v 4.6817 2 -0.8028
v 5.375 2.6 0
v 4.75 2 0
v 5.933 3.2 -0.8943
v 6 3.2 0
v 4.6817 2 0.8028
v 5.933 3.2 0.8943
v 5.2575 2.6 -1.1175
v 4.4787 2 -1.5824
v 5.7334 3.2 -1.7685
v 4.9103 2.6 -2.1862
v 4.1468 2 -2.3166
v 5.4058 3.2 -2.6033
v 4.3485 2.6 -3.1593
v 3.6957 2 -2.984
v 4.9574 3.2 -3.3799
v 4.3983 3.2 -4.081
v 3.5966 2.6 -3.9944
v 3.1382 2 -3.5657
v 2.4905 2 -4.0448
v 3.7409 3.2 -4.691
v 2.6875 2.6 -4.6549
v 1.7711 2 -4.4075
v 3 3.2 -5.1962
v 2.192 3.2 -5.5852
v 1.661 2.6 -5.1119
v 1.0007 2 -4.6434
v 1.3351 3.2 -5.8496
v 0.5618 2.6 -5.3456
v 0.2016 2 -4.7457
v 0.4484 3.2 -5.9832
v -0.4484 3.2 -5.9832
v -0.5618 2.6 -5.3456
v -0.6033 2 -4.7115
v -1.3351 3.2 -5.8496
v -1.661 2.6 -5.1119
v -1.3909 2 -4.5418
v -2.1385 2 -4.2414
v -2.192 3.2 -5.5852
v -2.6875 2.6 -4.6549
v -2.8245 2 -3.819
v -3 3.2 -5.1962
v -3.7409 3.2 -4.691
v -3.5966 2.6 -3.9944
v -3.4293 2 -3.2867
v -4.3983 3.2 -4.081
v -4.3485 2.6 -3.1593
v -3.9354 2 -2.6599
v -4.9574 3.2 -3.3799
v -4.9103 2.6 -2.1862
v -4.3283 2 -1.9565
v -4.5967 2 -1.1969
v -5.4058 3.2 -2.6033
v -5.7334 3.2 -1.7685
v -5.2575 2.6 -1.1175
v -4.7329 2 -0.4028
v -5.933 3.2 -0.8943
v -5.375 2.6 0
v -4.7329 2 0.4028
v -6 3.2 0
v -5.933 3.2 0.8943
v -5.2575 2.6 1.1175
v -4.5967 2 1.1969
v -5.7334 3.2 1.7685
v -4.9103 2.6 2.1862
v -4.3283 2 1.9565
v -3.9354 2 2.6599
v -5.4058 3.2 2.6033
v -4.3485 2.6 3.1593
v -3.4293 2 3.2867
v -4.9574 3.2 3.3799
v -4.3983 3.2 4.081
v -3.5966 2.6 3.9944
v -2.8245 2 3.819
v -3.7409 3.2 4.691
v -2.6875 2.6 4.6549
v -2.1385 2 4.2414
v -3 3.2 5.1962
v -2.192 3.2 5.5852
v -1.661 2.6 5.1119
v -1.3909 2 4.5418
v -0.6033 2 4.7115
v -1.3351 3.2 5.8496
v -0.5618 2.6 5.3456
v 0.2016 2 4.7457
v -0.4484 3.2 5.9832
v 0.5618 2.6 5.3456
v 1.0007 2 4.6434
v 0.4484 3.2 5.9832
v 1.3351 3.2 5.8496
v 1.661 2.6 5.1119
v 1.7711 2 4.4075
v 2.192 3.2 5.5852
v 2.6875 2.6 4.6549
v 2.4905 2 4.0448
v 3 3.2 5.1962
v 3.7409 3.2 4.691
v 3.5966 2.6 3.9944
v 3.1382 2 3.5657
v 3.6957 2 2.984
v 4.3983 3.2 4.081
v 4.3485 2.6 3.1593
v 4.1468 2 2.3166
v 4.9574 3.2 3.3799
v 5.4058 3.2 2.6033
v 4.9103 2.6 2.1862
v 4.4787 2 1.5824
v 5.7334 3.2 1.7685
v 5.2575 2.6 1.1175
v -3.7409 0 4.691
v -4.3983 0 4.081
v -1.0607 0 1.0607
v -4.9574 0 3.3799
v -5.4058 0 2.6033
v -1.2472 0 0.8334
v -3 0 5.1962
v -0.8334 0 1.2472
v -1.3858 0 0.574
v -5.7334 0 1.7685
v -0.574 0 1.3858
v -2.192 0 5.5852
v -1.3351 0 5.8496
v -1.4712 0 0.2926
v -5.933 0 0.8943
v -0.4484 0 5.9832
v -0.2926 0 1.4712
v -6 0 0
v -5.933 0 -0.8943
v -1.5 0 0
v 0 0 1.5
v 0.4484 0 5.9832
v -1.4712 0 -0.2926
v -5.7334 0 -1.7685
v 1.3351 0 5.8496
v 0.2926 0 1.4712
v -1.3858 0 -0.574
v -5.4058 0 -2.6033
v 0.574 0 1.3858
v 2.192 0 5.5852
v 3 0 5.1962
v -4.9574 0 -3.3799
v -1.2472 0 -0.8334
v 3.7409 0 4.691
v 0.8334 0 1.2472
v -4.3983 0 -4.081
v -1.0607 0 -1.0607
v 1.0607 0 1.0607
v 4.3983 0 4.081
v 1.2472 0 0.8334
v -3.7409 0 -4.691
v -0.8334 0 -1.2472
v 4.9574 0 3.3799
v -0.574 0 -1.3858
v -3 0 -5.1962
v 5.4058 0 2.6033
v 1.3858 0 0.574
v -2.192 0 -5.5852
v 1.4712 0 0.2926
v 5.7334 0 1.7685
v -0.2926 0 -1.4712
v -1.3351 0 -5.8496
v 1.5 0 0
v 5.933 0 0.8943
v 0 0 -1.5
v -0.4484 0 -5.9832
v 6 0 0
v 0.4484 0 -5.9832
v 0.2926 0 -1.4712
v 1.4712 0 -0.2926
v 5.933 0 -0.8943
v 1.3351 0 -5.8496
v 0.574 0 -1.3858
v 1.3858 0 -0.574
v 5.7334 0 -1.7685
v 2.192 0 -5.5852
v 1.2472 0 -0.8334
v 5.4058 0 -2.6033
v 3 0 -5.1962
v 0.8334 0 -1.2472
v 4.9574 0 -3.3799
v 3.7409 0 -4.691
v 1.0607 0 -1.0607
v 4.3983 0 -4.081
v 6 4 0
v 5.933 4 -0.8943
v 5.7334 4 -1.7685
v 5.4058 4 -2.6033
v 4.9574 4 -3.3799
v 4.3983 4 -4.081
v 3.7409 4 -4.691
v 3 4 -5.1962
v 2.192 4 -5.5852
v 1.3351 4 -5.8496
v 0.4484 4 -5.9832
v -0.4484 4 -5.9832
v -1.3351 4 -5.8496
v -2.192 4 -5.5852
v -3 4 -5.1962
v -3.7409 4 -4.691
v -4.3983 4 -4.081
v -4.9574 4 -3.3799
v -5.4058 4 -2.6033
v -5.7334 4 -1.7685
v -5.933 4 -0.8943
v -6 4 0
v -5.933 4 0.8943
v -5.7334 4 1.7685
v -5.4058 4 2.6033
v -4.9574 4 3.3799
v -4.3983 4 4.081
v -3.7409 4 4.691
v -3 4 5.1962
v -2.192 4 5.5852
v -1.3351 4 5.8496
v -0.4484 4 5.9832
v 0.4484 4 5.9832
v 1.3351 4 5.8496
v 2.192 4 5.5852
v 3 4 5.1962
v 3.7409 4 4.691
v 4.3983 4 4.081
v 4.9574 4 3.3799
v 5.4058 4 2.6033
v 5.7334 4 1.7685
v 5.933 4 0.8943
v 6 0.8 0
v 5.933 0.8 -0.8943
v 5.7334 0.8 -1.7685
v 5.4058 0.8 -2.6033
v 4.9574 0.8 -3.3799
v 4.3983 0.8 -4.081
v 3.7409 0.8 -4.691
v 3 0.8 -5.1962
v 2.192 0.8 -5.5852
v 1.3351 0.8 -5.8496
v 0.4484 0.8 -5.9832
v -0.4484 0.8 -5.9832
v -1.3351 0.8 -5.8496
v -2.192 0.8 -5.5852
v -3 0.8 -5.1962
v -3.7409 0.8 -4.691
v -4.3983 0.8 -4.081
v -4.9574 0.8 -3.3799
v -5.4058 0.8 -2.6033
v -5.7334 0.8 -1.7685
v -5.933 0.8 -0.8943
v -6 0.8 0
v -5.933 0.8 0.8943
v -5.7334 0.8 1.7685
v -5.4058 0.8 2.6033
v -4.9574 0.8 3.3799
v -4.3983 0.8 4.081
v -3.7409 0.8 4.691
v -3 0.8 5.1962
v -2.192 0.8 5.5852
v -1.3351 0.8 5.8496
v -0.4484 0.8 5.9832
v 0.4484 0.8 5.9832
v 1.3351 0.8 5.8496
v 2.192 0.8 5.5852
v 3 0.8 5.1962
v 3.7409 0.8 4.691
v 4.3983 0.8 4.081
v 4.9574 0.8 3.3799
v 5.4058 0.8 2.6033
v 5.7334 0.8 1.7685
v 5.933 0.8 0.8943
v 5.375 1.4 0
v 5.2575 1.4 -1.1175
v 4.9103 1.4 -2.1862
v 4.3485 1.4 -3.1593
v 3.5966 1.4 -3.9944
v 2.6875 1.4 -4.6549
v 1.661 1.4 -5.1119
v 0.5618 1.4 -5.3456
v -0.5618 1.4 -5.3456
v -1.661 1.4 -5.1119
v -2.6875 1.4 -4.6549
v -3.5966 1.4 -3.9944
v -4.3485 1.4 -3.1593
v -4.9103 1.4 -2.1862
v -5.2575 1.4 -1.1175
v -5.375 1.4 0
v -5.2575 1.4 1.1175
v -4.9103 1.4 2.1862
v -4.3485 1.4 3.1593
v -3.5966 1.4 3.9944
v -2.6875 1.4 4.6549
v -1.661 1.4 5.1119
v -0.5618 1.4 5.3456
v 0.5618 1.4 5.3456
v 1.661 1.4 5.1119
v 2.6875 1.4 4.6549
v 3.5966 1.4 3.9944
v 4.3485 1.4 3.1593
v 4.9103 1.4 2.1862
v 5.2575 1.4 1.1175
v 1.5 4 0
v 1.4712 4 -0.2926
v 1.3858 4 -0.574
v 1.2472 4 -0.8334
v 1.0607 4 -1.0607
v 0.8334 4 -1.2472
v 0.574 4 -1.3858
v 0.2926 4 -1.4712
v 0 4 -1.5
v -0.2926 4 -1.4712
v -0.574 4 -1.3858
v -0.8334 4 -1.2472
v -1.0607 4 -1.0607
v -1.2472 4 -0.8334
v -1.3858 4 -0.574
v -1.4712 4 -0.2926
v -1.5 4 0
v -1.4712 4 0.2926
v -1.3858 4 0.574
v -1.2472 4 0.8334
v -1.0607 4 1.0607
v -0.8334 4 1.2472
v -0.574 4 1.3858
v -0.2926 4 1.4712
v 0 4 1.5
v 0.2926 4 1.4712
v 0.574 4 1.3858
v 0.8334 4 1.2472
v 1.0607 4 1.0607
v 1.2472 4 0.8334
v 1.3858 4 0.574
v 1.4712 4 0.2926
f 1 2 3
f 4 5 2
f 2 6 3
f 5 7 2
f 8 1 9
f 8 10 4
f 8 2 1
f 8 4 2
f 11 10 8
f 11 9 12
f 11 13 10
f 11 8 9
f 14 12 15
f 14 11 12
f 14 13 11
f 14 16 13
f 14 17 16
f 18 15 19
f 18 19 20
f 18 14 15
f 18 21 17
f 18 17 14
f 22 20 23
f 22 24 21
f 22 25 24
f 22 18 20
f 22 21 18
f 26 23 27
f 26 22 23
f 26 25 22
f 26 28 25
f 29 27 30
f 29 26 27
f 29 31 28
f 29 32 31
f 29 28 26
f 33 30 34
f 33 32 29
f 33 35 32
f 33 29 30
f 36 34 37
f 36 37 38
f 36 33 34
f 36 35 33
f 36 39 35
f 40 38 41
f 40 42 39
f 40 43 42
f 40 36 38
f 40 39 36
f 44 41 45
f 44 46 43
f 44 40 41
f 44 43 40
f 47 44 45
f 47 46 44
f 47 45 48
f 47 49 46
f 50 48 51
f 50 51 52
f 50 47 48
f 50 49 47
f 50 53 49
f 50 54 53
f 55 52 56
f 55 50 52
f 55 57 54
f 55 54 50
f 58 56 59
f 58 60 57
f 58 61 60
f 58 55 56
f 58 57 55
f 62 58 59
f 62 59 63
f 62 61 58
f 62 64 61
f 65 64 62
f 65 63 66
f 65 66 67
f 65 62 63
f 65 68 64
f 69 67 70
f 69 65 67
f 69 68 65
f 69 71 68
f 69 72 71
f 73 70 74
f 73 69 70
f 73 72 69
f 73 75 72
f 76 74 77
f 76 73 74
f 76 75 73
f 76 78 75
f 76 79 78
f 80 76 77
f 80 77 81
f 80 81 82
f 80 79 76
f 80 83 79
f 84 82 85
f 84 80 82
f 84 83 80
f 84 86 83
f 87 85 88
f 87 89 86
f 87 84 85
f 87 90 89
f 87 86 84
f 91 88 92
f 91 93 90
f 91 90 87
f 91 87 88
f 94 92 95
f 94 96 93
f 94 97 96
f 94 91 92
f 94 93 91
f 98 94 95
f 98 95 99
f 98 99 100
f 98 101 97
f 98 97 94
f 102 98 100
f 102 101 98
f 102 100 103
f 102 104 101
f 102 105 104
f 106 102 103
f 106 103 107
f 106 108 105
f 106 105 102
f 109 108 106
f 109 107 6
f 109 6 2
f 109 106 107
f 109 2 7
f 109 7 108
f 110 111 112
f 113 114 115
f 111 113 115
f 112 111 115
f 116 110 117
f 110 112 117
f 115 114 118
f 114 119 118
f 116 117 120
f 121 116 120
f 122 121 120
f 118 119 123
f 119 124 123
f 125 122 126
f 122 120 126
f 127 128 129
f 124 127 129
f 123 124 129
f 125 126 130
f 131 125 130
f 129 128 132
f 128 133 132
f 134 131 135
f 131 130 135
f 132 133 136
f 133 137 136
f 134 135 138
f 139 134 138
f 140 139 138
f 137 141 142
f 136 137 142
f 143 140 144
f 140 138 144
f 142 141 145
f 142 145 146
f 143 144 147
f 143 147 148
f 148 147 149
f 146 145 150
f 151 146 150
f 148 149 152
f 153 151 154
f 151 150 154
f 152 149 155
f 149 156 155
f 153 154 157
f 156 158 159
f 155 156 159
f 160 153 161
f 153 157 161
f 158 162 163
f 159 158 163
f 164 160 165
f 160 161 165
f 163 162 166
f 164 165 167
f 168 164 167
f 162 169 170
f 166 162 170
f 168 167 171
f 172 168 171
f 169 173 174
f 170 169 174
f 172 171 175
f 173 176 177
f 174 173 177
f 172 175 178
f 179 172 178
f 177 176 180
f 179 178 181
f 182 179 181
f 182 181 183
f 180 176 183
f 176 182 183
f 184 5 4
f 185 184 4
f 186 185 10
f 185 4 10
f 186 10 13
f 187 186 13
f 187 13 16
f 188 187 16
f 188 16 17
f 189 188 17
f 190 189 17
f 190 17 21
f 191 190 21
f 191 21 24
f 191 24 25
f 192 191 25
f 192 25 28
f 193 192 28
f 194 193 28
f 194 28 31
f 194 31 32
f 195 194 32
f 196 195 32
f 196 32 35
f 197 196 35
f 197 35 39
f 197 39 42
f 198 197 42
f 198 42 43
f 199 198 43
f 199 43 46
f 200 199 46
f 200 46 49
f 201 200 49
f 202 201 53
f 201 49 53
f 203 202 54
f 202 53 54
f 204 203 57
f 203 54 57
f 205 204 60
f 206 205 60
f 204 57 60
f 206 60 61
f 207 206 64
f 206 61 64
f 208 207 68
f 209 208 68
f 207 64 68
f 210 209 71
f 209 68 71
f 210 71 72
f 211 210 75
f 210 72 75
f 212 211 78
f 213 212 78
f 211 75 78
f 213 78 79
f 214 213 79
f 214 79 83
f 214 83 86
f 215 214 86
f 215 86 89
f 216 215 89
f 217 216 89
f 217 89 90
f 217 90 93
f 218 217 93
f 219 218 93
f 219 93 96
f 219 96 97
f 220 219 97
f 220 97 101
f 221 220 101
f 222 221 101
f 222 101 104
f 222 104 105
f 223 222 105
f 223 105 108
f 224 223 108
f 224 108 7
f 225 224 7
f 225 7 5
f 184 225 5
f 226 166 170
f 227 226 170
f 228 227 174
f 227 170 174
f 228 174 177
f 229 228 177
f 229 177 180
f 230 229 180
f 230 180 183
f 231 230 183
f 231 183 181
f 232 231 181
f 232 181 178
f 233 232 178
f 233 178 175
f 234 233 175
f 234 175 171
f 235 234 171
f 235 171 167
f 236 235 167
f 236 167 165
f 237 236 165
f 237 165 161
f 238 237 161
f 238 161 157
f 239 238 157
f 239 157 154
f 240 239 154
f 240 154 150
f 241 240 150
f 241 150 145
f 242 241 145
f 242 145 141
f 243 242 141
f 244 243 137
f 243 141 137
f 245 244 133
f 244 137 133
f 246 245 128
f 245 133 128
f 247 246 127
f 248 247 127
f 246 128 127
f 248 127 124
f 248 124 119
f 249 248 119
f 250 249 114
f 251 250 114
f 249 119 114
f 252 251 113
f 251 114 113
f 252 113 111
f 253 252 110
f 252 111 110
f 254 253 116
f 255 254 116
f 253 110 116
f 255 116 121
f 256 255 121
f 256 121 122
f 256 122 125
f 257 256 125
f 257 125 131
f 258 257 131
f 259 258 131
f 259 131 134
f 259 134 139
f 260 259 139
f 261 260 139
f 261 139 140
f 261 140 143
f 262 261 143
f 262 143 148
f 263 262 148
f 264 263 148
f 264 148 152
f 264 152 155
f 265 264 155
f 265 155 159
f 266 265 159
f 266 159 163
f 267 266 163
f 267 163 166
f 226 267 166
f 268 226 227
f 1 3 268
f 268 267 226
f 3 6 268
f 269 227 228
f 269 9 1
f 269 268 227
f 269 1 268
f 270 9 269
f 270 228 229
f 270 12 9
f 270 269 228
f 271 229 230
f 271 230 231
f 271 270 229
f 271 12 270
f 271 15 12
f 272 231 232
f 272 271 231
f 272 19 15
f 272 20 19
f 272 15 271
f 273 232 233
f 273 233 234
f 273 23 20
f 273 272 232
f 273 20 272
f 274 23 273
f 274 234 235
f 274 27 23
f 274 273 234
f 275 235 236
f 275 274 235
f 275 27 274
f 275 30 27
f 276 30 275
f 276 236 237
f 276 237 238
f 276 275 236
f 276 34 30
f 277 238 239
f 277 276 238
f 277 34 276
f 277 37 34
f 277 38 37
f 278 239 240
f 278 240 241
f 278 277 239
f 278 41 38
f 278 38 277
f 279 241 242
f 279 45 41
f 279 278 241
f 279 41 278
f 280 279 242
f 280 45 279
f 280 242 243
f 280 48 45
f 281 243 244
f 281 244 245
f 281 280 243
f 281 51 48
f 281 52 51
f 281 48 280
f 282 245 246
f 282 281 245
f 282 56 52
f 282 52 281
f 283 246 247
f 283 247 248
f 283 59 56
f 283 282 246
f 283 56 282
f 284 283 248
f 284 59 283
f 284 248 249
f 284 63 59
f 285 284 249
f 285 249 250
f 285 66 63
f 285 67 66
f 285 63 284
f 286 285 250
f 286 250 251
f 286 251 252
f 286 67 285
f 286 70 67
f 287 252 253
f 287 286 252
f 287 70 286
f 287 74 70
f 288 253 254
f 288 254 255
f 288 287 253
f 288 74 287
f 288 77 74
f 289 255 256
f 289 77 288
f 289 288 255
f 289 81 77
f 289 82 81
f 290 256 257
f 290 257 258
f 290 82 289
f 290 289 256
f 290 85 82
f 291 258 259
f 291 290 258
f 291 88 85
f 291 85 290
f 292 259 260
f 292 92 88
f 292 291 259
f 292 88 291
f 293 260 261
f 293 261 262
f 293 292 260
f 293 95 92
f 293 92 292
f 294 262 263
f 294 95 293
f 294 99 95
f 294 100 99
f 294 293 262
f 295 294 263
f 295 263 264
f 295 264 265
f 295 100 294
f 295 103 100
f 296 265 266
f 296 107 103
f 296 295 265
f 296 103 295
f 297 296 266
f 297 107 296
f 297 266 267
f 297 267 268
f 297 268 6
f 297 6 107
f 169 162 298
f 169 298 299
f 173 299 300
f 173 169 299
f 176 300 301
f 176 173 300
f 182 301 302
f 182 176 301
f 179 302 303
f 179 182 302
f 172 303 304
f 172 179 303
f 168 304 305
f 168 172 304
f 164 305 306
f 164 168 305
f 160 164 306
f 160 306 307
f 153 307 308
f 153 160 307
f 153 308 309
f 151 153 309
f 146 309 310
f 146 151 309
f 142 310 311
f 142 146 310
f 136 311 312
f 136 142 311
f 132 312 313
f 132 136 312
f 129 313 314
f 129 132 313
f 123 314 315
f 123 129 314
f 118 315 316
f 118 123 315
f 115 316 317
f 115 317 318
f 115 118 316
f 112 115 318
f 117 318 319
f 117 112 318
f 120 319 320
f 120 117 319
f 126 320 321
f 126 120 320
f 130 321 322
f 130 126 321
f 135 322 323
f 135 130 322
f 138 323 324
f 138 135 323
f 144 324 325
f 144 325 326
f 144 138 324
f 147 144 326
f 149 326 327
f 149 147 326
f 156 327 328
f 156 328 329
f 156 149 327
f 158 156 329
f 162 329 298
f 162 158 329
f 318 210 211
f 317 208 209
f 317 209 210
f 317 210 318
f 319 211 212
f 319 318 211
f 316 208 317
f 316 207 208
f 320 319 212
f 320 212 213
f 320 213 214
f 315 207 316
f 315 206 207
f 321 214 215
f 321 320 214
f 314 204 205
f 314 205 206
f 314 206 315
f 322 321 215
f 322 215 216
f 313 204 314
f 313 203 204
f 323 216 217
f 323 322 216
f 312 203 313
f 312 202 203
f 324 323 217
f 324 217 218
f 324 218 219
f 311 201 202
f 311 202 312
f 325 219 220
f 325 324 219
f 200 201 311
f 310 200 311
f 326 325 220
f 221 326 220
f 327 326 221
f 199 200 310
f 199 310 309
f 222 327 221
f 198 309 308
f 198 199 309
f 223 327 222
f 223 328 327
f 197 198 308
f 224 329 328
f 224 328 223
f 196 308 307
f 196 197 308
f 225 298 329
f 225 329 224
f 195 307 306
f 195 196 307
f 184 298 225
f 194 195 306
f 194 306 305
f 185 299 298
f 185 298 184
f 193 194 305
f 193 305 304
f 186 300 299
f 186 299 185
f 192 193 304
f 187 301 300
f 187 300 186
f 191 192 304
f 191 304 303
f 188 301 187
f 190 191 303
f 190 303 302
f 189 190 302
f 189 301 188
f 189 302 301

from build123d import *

# Parameters (mm, degrees)
SKETCH1_R           = 6
SKETCH1_R_2         = 1.5
BOSS_EXTRUDE1_DEPTH = 4


with BuildPart() as part:
    # Sketch1 → Boss-Extrude1 (new body)
    with BuildSketch(Plane(origin=(0, 0, 0), x_dir=(1, 0, 0), z_dir=(0, 1, 0))):
        Circle(SKETCH1_R)
        Circle(SKETCH1_R_2, mode=Mode.SUBTRACT)
    extrude(amount=BOSS_EXTRUDE1_DEPTH)

    # Cut-Sweep3: sweep along a path in Sketch3
    with BuildLine(Plane(origin=(0, 2, 0), x_dir=(1, 0, 0), z_dir=(0, 1, 0))) as cut_sweep3_path:
        CenterArc((0, 0), 6, 0, 360)
    # Sketch2 → Cut-Sweep3 (sweep, cut)
    with BuildSketch(Plane.XY):
        Polygon((-6, 3.2), (-6, 0.8), (-4.75, 2), align=None)
    sweep(path=cut_sweep3_path.line, mode=Mode.SUBTRACT)


solid = part.part
